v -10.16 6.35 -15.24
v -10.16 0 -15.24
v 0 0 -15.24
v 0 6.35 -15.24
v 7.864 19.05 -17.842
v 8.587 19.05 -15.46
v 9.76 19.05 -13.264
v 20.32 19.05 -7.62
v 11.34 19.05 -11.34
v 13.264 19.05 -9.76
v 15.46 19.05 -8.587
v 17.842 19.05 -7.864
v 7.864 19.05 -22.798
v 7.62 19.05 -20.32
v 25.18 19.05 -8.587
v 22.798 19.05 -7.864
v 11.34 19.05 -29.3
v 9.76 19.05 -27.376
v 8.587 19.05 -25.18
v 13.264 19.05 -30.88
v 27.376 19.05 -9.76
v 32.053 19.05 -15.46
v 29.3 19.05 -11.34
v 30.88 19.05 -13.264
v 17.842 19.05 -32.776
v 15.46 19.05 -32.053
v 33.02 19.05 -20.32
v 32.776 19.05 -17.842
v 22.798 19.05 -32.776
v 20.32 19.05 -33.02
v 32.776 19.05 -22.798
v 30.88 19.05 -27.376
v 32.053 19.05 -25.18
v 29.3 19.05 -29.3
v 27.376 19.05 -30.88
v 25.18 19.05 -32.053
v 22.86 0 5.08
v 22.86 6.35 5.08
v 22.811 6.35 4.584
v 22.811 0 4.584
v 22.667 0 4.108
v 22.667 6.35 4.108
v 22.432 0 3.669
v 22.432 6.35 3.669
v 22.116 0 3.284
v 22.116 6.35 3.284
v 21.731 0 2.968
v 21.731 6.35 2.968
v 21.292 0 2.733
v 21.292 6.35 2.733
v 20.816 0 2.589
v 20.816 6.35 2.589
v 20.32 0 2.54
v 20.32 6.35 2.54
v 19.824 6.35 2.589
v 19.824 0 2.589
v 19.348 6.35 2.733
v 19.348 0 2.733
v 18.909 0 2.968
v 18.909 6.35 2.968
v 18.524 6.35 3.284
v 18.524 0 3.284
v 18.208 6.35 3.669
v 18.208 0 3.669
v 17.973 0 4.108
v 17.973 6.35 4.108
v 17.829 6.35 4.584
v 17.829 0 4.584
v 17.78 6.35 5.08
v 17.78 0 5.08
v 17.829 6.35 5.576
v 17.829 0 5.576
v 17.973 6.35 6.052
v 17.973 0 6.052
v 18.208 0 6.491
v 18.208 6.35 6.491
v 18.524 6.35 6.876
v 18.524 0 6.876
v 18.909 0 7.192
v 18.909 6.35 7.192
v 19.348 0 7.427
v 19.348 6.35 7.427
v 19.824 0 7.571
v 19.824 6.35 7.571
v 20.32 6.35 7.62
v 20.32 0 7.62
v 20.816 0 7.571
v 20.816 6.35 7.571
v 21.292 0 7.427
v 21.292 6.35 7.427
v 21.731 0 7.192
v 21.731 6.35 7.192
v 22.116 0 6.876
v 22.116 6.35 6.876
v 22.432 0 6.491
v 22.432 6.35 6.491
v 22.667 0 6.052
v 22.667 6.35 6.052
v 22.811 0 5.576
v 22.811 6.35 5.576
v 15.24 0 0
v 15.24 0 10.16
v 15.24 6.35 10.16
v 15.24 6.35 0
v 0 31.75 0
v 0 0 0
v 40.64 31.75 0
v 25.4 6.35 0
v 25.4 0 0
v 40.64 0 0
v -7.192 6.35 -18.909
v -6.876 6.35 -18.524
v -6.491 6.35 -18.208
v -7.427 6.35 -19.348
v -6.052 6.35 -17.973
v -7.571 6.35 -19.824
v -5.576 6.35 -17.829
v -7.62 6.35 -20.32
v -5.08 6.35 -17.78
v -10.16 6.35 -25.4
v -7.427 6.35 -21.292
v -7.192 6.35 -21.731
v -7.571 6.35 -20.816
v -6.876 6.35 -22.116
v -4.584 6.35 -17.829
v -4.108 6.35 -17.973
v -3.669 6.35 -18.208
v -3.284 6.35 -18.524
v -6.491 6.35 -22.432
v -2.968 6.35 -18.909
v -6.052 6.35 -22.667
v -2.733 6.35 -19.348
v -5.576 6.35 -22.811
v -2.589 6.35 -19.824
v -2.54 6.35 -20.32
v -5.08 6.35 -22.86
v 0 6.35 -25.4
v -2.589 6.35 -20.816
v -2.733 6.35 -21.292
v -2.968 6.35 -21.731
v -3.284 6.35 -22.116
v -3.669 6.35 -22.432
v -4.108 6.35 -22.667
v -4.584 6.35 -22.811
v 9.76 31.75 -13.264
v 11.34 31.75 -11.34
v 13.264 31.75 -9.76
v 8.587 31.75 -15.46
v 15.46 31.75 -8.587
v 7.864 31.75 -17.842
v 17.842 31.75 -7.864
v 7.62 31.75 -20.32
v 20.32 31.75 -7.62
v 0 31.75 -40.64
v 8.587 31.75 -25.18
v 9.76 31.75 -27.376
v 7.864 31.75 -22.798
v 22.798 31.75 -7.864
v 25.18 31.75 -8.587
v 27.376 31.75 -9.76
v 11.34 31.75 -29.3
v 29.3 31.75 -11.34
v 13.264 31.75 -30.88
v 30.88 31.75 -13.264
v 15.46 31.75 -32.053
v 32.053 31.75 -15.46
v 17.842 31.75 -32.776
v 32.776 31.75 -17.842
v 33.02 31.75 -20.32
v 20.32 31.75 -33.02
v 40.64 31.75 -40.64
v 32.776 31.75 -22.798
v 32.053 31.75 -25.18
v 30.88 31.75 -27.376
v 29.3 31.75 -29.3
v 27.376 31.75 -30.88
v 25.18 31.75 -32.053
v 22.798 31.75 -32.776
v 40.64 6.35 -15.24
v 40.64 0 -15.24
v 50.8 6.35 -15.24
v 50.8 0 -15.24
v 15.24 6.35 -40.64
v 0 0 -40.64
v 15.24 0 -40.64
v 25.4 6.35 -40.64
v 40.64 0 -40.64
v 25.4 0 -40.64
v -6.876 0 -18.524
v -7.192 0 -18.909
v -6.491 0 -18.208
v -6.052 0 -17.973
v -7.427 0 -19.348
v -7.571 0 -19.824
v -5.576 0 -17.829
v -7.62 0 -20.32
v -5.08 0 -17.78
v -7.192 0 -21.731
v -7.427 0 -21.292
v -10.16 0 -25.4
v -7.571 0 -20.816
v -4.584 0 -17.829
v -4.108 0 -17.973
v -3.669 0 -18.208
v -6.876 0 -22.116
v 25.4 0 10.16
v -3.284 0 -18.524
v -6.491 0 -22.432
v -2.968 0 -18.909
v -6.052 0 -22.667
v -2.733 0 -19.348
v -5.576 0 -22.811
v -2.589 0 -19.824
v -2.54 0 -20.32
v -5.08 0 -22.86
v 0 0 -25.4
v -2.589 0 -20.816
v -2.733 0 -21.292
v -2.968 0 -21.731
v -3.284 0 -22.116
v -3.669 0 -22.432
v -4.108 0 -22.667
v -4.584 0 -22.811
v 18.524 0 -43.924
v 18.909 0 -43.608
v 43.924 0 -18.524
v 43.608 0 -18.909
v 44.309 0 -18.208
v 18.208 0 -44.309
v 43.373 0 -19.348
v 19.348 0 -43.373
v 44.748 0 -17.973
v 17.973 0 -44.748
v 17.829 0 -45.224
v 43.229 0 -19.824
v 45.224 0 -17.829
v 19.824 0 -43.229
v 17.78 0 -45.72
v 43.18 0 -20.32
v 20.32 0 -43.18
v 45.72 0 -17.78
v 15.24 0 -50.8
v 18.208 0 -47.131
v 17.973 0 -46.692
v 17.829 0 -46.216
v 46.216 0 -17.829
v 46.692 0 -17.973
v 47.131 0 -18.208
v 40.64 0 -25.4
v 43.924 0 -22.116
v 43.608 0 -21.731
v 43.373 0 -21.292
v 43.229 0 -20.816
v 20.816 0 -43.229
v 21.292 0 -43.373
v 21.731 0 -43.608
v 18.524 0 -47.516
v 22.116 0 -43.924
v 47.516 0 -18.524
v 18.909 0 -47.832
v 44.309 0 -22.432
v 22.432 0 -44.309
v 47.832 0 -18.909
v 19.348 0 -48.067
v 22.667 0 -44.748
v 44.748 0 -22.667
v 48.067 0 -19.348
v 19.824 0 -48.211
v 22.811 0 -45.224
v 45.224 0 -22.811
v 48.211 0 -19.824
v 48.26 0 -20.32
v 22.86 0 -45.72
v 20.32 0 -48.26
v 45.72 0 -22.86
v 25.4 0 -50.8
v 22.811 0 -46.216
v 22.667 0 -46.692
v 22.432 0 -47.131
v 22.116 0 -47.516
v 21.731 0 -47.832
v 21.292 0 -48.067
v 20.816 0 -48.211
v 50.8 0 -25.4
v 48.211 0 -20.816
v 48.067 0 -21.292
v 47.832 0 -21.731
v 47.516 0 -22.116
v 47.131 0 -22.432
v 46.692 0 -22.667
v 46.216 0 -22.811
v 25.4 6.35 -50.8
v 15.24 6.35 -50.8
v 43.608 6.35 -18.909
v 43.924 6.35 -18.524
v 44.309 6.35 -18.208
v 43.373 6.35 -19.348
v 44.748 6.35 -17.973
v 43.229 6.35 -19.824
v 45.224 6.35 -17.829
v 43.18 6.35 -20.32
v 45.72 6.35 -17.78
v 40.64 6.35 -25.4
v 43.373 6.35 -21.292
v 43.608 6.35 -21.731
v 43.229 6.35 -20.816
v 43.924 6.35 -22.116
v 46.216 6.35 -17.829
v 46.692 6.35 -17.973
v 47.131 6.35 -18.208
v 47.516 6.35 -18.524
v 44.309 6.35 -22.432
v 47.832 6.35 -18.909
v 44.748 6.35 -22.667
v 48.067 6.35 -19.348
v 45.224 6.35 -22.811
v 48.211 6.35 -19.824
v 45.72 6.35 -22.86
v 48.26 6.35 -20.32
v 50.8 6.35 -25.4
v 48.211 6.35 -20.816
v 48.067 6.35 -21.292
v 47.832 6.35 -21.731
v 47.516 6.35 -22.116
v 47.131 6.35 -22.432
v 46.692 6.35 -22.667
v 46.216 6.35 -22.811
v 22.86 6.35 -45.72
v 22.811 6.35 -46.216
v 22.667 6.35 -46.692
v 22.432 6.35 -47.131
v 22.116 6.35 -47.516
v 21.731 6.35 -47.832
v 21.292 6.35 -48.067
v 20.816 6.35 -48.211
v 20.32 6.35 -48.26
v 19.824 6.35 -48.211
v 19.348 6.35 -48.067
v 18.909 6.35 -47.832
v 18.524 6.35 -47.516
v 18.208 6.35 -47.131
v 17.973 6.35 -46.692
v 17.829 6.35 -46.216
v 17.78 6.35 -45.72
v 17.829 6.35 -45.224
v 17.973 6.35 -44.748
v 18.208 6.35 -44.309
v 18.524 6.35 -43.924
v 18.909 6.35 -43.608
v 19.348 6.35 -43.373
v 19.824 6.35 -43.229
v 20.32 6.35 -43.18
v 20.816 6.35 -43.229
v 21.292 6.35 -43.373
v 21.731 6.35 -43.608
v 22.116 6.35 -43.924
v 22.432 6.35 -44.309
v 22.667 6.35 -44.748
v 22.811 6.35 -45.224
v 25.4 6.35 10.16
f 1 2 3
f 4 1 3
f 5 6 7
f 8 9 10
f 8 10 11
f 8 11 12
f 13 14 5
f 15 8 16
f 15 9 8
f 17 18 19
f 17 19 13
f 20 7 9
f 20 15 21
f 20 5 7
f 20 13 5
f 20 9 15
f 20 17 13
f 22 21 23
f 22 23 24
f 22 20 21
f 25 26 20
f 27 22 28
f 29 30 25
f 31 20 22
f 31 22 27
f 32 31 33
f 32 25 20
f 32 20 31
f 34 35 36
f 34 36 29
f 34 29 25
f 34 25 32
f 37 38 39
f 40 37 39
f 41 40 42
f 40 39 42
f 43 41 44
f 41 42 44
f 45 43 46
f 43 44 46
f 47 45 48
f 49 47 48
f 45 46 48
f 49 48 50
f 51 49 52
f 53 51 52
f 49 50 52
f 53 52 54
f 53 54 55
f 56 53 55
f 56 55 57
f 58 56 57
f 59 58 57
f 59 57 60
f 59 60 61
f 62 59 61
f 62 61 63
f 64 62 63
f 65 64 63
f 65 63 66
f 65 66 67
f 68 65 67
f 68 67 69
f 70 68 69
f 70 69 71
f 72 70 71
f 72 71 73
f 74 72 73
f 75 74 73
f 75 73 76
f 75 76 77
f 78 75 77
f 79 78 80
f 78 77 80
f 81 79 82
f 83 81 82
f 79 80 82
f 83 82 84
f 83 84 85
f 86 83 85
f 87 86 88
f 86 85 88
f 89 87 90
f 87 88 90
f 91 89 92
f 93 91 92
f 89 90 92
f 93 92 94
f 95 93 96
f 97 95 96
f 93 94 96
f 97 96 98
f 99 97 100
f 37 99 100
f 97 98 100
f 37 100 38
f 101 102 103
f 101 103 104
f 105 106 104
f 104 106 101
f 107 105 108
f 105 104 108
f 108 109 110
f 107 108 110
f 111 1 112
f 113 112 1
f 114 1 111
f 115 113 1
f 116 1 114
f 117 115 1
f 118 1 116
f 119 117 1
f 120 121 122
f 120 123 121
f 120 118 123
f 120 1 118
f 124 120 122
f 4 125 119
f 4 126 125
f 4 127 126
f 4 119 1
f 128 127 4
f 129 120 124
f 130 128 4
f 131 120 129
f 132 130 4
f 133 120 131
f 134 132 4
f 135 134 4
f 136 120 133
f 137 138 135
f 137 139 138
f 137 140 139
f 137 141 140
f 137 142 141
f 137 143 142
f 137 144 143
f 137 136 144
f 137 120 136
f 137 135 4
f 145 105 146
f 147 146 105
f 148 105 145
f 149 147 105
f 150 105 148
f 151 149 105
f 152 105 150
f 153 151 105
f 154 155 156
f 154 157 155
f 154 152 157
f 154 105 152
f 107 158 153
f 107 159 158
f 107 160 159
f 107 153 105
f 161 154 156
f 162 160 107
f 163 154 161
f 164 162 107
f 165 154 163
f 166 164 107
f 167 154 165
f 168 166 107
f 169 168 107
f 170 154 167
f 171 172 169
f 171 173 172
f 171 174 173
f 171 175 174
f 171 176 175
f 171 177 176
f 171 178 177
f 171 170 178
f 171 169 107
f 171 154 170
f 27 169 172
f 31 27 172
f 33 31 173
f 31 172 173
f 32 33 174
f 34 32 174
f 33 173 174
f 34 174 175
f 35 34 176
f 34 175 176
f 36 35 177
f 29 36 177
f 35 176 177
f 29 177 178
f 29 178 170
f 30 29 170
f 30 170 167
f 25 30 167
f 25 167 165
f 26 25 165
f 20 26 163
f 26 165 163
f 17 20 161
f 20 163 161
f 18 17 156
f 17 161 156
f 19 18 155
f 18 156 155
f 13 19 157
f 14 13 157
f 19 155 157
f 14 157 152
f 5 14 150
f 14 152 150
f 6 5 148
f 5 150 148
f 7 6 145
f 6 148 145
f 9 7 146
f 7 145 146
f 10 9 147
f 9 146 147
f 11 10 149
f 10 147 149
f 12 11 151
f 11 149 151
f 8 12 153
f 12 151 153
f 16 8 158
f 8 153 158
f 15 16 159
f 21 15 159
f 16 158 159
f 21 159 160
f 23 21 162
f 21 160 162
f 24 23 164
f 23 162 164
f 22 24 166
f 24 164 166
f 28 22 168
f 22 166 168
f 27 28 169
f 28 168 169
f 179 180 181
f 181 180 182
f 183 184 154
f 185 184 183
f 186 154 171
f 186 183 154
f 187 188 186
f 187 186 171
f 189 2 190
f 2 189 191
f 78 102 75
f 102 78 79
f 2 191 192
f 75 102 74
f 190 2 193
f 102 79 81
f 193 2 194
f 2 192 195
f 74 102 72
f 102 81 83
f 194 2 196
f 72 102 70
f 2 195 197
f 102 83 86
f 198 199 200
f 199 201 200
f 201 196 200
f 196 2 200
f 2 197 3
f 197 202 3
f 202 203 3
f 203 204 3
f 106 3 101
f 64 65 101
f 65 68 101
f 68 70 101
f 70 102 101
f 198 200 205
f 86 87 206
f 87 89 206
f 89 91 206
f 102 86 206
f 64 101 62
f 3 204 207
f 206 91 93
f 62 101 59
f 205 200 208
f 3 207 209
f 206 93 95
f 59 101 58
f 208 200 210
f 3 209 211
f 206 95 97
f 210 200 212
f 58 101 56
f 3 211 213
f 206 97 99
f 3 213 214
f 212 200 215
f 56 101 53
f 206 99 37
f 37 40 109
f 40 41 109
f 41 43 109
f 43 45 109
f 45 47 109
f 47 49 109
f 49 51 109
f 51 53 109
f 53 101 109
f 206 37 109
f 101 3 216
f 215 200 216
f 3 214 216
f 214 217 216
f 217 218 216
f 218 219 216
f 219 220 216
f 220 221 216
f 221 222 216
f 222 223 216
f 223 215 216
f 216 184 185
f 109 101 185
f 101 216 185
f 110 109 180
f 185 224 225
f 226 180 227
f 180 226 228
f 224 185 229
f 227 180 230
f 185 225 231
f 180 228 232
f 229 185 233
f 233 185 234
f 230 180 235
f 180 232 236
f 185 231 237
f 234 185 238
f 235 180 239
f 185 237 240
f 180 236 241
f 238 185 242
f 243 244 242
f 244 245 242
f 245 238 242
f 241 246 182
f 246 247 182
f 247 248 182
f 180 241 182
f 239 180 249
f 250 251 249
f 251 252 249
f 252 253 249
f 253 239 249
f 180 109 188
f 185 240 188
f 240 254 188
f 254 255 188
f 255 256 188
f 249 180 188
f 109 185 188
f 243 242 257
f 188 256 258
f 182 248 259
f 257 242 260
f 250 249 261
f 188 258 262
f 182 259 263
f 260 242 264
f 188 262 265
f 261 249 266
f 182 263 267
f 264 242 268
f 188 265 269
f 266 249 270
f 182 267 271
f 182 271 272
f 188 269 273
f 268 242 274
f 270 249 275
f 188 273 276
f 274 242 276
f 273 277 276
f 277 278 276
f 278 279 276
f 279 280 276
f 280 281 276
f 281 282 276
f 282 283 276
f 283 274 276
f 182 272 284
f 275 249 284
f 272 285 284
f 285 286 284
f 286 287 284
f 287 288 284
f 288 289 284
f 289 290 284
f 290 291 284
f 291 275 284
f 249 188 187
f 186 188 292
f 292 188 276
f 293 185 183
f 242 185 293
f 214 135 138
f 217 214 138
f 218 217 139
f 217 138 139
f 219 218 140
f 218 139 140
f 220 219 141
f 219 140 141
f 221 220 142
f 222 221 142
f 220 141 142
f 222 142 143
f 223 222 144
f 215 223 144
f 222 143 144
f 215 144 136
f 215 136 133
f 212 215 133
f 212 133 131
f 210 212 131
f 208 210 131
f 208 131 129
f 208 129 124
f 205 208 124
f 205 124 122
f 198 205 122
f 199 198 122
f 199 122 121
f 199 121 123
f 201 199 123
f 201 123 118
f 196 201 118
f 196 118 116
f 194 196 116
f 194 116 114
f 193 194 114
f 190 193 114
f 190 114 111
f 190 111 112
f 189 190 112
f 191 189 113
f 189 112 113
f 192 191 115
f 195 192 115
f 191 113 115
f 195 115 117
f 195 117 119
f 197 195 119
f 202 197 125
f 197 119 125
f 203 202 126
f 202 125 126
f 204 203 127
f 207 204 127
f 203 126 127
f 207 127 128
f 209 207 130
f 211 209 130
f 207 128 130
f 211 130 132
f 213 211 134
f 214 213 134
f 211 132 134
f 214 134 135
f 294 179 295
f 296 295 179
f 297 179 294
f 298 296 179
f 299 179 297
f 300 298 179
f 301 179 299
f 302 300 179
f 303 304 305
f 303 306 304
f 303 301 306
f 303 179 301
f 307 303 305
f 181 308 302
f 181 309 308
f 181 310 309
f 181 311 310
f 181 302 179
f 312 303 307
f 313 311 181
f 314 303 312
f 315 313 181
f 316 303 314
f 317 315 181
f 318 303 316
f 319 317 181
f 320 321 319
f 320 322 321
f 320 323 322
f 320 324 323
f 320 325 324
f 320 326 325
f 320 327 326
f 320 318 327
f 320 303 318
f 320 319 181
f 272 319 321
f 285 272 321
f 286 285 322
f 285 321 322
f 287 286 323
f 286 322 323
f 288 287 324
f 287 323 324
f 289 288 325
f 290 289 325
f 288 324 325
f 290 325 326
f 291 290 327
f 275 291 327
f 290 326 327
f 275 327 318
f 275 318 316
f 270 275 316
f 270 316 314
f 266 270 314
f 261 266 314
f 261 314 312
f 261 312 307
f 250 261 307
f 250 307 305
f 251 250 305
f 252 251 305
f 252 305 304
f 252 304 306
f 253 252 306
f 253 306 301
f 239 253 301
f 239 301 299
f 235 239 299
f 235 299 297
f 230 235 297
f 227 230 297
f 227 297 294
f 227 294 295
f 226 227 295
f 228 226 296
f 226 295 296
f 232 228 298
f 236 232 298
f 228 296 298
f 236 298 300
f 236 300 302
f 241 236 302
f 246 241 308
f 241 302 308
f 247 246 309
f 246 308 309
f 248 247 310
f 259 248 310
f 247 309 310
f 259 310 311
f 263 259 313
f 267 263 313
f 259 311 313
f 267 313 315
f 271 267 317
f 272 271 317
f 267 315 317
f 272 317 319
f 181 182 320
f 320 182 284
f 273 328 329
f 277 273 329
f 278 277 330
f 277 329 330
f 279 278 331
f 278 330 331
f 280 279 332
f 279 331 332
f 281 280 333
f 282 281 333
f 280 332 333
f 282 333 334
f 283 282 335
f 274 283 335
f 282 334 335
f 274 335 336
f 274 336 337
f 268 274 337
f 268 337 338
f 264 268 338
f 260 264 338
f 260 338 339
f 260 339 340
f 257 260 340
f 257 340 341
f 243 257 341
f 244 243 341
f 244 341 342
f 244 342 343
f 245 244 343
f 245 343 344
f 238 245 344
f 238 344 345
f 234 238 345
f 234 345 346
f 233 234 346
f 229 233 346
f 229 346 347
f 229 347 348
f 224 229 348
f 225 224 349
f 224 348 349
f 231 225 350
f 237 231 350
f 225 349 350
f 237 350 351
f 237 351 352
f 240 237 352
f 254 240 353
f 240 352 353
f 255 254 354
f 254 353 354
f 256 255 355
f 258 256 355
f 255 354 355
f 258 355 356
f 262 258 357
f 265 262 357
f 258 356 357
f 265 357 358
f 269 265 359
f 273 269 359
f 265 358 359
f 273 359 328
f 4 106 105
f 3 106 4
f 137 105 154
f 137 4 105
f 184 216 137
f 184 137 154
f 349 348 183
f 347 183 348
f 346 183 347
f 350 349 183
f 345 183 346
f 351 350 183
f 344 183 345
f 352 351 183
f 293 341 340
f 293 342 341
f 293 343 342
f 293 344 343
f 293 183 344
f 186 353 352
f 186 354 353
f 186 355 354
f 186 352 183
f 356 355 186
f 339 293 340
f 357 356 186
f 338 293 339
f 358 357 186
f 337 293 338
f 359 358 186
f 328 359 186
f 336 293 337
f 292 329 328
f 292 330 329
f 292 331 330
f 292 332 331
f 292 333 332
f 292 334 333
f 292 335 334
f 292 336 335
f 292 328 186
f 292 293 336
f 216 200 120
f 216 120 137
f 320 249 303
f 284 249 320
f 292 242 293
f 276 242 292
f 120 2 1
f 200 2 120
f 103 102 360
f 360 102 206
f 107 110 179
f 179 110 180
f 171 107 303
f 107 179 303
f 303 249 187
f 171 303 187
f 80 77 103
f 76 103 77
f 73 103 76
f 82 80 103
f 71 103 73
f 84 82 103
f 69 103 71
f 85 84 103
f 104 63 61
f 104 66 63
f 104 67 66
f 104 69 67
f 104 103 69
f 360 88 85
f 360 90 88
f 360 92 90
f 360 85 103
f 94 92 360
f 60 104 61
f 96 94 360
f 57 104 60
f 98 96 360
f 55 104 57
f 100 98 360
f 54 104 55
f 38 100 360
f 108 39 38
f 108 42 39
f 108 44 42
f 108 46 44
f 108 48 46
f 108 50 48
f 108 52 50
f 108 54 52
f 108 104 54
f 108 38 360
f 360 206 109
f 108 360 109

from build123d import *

# Parameters (mm, degrees)
SKETCH1_W           = 10.16
SKETCH1_H           = 10.16
SKETCH1_W_2         = 40.64
SKETCH1_H_2         = 40.64
BOSS_EXTRUDE1_DEPTH = 6.35
SKETCH2_R           = 2.54
CUT_EXTRUDE1_DEPTH  = 8.89
SKETCH3_W           = 40.64
SKETCH3_H           = 40.64
BODY_EXTRUDE_DEPTH  = 25.4
SKETCH4_R           = 12.7
MOTOR_HOLE_DEPTH    = 12.7


with BuildPart() as part:
    # Sketch1 → Boss-Extrude1 (new body)
    with BuildSketch(Plane(origin=(0, 0, 0), x_dir=(1, 0, 0), z_dir=(0, 1, 0))):
        with Locations((-5.08, 20.32)):
            Rectangle(SKETCH1_W, SKETCH1_H)
        with Locations((20.32, 45.72)):
            Rectangle(SKETCH1_W, SKETCH1_H)
        with Locations((20.32, 20.32)):
            Rectangle(SKETCH1_W_2, SKETCH1_H_2)
        with Locations((45.72, 20.32)):
            Rectangle(SKETCH1_W, SKETCH1_H)
        with Locations((20.32, -5.08)):
            Rectangle(SKETCH1_W, SKETCH1_H)
    extrude(amount=BOSS_EXTRUDE1_DEPTH)

    # Sketch2 → Cut-Extrude1 (cut)
    with BuildSketch(Plane(origin=(0, 6.35, 0), x_dir=(1, 0, 0), z_dir=(0, 1, 0))):
        with Locations((-5.08, 20.32)):
            Circle(SKETCH2_R)
        with Locations((20.32, 45.72)):
            Circle(SKETCH2_R)
        with Locations((45.72, 20.32)):
            Circle(SKETCH2_R)
        with Locations((20.32, -5.08)):
            Circle(SKETCH2_R)
    extrude(amount=-CUT_EXTRUDE1_DEPTH, mode=Mode.SUBTRACT)

    # Sketch3 → body_extrude (add)
    with BuildSketch(Plane(origin=(0, 6.35, 0), x_dir=(1, 0, 0), z_dir=(0, 1, 0))):
        with Locations((20.32, 20.32)):
            Rectangle(SKETCH3_W, SKETCH3_H)
    extrude(amount=BODY_EXTRUDE_DEPTH)

    # Sketch4 → motor_hole (cut)
    with BuildSketch(Plane(origin=(0, 31.75, 0), x_dir=(1, 0, 0), z_dir=(0, 1, 0))):
        with Locations((20.32, 20.32)):
            Circle(SKETCH4_R)
    extrude(amount=-MOTOR_HOLE_DEPTH, mode=Mode.SUBTRACT)


solid = part.part
